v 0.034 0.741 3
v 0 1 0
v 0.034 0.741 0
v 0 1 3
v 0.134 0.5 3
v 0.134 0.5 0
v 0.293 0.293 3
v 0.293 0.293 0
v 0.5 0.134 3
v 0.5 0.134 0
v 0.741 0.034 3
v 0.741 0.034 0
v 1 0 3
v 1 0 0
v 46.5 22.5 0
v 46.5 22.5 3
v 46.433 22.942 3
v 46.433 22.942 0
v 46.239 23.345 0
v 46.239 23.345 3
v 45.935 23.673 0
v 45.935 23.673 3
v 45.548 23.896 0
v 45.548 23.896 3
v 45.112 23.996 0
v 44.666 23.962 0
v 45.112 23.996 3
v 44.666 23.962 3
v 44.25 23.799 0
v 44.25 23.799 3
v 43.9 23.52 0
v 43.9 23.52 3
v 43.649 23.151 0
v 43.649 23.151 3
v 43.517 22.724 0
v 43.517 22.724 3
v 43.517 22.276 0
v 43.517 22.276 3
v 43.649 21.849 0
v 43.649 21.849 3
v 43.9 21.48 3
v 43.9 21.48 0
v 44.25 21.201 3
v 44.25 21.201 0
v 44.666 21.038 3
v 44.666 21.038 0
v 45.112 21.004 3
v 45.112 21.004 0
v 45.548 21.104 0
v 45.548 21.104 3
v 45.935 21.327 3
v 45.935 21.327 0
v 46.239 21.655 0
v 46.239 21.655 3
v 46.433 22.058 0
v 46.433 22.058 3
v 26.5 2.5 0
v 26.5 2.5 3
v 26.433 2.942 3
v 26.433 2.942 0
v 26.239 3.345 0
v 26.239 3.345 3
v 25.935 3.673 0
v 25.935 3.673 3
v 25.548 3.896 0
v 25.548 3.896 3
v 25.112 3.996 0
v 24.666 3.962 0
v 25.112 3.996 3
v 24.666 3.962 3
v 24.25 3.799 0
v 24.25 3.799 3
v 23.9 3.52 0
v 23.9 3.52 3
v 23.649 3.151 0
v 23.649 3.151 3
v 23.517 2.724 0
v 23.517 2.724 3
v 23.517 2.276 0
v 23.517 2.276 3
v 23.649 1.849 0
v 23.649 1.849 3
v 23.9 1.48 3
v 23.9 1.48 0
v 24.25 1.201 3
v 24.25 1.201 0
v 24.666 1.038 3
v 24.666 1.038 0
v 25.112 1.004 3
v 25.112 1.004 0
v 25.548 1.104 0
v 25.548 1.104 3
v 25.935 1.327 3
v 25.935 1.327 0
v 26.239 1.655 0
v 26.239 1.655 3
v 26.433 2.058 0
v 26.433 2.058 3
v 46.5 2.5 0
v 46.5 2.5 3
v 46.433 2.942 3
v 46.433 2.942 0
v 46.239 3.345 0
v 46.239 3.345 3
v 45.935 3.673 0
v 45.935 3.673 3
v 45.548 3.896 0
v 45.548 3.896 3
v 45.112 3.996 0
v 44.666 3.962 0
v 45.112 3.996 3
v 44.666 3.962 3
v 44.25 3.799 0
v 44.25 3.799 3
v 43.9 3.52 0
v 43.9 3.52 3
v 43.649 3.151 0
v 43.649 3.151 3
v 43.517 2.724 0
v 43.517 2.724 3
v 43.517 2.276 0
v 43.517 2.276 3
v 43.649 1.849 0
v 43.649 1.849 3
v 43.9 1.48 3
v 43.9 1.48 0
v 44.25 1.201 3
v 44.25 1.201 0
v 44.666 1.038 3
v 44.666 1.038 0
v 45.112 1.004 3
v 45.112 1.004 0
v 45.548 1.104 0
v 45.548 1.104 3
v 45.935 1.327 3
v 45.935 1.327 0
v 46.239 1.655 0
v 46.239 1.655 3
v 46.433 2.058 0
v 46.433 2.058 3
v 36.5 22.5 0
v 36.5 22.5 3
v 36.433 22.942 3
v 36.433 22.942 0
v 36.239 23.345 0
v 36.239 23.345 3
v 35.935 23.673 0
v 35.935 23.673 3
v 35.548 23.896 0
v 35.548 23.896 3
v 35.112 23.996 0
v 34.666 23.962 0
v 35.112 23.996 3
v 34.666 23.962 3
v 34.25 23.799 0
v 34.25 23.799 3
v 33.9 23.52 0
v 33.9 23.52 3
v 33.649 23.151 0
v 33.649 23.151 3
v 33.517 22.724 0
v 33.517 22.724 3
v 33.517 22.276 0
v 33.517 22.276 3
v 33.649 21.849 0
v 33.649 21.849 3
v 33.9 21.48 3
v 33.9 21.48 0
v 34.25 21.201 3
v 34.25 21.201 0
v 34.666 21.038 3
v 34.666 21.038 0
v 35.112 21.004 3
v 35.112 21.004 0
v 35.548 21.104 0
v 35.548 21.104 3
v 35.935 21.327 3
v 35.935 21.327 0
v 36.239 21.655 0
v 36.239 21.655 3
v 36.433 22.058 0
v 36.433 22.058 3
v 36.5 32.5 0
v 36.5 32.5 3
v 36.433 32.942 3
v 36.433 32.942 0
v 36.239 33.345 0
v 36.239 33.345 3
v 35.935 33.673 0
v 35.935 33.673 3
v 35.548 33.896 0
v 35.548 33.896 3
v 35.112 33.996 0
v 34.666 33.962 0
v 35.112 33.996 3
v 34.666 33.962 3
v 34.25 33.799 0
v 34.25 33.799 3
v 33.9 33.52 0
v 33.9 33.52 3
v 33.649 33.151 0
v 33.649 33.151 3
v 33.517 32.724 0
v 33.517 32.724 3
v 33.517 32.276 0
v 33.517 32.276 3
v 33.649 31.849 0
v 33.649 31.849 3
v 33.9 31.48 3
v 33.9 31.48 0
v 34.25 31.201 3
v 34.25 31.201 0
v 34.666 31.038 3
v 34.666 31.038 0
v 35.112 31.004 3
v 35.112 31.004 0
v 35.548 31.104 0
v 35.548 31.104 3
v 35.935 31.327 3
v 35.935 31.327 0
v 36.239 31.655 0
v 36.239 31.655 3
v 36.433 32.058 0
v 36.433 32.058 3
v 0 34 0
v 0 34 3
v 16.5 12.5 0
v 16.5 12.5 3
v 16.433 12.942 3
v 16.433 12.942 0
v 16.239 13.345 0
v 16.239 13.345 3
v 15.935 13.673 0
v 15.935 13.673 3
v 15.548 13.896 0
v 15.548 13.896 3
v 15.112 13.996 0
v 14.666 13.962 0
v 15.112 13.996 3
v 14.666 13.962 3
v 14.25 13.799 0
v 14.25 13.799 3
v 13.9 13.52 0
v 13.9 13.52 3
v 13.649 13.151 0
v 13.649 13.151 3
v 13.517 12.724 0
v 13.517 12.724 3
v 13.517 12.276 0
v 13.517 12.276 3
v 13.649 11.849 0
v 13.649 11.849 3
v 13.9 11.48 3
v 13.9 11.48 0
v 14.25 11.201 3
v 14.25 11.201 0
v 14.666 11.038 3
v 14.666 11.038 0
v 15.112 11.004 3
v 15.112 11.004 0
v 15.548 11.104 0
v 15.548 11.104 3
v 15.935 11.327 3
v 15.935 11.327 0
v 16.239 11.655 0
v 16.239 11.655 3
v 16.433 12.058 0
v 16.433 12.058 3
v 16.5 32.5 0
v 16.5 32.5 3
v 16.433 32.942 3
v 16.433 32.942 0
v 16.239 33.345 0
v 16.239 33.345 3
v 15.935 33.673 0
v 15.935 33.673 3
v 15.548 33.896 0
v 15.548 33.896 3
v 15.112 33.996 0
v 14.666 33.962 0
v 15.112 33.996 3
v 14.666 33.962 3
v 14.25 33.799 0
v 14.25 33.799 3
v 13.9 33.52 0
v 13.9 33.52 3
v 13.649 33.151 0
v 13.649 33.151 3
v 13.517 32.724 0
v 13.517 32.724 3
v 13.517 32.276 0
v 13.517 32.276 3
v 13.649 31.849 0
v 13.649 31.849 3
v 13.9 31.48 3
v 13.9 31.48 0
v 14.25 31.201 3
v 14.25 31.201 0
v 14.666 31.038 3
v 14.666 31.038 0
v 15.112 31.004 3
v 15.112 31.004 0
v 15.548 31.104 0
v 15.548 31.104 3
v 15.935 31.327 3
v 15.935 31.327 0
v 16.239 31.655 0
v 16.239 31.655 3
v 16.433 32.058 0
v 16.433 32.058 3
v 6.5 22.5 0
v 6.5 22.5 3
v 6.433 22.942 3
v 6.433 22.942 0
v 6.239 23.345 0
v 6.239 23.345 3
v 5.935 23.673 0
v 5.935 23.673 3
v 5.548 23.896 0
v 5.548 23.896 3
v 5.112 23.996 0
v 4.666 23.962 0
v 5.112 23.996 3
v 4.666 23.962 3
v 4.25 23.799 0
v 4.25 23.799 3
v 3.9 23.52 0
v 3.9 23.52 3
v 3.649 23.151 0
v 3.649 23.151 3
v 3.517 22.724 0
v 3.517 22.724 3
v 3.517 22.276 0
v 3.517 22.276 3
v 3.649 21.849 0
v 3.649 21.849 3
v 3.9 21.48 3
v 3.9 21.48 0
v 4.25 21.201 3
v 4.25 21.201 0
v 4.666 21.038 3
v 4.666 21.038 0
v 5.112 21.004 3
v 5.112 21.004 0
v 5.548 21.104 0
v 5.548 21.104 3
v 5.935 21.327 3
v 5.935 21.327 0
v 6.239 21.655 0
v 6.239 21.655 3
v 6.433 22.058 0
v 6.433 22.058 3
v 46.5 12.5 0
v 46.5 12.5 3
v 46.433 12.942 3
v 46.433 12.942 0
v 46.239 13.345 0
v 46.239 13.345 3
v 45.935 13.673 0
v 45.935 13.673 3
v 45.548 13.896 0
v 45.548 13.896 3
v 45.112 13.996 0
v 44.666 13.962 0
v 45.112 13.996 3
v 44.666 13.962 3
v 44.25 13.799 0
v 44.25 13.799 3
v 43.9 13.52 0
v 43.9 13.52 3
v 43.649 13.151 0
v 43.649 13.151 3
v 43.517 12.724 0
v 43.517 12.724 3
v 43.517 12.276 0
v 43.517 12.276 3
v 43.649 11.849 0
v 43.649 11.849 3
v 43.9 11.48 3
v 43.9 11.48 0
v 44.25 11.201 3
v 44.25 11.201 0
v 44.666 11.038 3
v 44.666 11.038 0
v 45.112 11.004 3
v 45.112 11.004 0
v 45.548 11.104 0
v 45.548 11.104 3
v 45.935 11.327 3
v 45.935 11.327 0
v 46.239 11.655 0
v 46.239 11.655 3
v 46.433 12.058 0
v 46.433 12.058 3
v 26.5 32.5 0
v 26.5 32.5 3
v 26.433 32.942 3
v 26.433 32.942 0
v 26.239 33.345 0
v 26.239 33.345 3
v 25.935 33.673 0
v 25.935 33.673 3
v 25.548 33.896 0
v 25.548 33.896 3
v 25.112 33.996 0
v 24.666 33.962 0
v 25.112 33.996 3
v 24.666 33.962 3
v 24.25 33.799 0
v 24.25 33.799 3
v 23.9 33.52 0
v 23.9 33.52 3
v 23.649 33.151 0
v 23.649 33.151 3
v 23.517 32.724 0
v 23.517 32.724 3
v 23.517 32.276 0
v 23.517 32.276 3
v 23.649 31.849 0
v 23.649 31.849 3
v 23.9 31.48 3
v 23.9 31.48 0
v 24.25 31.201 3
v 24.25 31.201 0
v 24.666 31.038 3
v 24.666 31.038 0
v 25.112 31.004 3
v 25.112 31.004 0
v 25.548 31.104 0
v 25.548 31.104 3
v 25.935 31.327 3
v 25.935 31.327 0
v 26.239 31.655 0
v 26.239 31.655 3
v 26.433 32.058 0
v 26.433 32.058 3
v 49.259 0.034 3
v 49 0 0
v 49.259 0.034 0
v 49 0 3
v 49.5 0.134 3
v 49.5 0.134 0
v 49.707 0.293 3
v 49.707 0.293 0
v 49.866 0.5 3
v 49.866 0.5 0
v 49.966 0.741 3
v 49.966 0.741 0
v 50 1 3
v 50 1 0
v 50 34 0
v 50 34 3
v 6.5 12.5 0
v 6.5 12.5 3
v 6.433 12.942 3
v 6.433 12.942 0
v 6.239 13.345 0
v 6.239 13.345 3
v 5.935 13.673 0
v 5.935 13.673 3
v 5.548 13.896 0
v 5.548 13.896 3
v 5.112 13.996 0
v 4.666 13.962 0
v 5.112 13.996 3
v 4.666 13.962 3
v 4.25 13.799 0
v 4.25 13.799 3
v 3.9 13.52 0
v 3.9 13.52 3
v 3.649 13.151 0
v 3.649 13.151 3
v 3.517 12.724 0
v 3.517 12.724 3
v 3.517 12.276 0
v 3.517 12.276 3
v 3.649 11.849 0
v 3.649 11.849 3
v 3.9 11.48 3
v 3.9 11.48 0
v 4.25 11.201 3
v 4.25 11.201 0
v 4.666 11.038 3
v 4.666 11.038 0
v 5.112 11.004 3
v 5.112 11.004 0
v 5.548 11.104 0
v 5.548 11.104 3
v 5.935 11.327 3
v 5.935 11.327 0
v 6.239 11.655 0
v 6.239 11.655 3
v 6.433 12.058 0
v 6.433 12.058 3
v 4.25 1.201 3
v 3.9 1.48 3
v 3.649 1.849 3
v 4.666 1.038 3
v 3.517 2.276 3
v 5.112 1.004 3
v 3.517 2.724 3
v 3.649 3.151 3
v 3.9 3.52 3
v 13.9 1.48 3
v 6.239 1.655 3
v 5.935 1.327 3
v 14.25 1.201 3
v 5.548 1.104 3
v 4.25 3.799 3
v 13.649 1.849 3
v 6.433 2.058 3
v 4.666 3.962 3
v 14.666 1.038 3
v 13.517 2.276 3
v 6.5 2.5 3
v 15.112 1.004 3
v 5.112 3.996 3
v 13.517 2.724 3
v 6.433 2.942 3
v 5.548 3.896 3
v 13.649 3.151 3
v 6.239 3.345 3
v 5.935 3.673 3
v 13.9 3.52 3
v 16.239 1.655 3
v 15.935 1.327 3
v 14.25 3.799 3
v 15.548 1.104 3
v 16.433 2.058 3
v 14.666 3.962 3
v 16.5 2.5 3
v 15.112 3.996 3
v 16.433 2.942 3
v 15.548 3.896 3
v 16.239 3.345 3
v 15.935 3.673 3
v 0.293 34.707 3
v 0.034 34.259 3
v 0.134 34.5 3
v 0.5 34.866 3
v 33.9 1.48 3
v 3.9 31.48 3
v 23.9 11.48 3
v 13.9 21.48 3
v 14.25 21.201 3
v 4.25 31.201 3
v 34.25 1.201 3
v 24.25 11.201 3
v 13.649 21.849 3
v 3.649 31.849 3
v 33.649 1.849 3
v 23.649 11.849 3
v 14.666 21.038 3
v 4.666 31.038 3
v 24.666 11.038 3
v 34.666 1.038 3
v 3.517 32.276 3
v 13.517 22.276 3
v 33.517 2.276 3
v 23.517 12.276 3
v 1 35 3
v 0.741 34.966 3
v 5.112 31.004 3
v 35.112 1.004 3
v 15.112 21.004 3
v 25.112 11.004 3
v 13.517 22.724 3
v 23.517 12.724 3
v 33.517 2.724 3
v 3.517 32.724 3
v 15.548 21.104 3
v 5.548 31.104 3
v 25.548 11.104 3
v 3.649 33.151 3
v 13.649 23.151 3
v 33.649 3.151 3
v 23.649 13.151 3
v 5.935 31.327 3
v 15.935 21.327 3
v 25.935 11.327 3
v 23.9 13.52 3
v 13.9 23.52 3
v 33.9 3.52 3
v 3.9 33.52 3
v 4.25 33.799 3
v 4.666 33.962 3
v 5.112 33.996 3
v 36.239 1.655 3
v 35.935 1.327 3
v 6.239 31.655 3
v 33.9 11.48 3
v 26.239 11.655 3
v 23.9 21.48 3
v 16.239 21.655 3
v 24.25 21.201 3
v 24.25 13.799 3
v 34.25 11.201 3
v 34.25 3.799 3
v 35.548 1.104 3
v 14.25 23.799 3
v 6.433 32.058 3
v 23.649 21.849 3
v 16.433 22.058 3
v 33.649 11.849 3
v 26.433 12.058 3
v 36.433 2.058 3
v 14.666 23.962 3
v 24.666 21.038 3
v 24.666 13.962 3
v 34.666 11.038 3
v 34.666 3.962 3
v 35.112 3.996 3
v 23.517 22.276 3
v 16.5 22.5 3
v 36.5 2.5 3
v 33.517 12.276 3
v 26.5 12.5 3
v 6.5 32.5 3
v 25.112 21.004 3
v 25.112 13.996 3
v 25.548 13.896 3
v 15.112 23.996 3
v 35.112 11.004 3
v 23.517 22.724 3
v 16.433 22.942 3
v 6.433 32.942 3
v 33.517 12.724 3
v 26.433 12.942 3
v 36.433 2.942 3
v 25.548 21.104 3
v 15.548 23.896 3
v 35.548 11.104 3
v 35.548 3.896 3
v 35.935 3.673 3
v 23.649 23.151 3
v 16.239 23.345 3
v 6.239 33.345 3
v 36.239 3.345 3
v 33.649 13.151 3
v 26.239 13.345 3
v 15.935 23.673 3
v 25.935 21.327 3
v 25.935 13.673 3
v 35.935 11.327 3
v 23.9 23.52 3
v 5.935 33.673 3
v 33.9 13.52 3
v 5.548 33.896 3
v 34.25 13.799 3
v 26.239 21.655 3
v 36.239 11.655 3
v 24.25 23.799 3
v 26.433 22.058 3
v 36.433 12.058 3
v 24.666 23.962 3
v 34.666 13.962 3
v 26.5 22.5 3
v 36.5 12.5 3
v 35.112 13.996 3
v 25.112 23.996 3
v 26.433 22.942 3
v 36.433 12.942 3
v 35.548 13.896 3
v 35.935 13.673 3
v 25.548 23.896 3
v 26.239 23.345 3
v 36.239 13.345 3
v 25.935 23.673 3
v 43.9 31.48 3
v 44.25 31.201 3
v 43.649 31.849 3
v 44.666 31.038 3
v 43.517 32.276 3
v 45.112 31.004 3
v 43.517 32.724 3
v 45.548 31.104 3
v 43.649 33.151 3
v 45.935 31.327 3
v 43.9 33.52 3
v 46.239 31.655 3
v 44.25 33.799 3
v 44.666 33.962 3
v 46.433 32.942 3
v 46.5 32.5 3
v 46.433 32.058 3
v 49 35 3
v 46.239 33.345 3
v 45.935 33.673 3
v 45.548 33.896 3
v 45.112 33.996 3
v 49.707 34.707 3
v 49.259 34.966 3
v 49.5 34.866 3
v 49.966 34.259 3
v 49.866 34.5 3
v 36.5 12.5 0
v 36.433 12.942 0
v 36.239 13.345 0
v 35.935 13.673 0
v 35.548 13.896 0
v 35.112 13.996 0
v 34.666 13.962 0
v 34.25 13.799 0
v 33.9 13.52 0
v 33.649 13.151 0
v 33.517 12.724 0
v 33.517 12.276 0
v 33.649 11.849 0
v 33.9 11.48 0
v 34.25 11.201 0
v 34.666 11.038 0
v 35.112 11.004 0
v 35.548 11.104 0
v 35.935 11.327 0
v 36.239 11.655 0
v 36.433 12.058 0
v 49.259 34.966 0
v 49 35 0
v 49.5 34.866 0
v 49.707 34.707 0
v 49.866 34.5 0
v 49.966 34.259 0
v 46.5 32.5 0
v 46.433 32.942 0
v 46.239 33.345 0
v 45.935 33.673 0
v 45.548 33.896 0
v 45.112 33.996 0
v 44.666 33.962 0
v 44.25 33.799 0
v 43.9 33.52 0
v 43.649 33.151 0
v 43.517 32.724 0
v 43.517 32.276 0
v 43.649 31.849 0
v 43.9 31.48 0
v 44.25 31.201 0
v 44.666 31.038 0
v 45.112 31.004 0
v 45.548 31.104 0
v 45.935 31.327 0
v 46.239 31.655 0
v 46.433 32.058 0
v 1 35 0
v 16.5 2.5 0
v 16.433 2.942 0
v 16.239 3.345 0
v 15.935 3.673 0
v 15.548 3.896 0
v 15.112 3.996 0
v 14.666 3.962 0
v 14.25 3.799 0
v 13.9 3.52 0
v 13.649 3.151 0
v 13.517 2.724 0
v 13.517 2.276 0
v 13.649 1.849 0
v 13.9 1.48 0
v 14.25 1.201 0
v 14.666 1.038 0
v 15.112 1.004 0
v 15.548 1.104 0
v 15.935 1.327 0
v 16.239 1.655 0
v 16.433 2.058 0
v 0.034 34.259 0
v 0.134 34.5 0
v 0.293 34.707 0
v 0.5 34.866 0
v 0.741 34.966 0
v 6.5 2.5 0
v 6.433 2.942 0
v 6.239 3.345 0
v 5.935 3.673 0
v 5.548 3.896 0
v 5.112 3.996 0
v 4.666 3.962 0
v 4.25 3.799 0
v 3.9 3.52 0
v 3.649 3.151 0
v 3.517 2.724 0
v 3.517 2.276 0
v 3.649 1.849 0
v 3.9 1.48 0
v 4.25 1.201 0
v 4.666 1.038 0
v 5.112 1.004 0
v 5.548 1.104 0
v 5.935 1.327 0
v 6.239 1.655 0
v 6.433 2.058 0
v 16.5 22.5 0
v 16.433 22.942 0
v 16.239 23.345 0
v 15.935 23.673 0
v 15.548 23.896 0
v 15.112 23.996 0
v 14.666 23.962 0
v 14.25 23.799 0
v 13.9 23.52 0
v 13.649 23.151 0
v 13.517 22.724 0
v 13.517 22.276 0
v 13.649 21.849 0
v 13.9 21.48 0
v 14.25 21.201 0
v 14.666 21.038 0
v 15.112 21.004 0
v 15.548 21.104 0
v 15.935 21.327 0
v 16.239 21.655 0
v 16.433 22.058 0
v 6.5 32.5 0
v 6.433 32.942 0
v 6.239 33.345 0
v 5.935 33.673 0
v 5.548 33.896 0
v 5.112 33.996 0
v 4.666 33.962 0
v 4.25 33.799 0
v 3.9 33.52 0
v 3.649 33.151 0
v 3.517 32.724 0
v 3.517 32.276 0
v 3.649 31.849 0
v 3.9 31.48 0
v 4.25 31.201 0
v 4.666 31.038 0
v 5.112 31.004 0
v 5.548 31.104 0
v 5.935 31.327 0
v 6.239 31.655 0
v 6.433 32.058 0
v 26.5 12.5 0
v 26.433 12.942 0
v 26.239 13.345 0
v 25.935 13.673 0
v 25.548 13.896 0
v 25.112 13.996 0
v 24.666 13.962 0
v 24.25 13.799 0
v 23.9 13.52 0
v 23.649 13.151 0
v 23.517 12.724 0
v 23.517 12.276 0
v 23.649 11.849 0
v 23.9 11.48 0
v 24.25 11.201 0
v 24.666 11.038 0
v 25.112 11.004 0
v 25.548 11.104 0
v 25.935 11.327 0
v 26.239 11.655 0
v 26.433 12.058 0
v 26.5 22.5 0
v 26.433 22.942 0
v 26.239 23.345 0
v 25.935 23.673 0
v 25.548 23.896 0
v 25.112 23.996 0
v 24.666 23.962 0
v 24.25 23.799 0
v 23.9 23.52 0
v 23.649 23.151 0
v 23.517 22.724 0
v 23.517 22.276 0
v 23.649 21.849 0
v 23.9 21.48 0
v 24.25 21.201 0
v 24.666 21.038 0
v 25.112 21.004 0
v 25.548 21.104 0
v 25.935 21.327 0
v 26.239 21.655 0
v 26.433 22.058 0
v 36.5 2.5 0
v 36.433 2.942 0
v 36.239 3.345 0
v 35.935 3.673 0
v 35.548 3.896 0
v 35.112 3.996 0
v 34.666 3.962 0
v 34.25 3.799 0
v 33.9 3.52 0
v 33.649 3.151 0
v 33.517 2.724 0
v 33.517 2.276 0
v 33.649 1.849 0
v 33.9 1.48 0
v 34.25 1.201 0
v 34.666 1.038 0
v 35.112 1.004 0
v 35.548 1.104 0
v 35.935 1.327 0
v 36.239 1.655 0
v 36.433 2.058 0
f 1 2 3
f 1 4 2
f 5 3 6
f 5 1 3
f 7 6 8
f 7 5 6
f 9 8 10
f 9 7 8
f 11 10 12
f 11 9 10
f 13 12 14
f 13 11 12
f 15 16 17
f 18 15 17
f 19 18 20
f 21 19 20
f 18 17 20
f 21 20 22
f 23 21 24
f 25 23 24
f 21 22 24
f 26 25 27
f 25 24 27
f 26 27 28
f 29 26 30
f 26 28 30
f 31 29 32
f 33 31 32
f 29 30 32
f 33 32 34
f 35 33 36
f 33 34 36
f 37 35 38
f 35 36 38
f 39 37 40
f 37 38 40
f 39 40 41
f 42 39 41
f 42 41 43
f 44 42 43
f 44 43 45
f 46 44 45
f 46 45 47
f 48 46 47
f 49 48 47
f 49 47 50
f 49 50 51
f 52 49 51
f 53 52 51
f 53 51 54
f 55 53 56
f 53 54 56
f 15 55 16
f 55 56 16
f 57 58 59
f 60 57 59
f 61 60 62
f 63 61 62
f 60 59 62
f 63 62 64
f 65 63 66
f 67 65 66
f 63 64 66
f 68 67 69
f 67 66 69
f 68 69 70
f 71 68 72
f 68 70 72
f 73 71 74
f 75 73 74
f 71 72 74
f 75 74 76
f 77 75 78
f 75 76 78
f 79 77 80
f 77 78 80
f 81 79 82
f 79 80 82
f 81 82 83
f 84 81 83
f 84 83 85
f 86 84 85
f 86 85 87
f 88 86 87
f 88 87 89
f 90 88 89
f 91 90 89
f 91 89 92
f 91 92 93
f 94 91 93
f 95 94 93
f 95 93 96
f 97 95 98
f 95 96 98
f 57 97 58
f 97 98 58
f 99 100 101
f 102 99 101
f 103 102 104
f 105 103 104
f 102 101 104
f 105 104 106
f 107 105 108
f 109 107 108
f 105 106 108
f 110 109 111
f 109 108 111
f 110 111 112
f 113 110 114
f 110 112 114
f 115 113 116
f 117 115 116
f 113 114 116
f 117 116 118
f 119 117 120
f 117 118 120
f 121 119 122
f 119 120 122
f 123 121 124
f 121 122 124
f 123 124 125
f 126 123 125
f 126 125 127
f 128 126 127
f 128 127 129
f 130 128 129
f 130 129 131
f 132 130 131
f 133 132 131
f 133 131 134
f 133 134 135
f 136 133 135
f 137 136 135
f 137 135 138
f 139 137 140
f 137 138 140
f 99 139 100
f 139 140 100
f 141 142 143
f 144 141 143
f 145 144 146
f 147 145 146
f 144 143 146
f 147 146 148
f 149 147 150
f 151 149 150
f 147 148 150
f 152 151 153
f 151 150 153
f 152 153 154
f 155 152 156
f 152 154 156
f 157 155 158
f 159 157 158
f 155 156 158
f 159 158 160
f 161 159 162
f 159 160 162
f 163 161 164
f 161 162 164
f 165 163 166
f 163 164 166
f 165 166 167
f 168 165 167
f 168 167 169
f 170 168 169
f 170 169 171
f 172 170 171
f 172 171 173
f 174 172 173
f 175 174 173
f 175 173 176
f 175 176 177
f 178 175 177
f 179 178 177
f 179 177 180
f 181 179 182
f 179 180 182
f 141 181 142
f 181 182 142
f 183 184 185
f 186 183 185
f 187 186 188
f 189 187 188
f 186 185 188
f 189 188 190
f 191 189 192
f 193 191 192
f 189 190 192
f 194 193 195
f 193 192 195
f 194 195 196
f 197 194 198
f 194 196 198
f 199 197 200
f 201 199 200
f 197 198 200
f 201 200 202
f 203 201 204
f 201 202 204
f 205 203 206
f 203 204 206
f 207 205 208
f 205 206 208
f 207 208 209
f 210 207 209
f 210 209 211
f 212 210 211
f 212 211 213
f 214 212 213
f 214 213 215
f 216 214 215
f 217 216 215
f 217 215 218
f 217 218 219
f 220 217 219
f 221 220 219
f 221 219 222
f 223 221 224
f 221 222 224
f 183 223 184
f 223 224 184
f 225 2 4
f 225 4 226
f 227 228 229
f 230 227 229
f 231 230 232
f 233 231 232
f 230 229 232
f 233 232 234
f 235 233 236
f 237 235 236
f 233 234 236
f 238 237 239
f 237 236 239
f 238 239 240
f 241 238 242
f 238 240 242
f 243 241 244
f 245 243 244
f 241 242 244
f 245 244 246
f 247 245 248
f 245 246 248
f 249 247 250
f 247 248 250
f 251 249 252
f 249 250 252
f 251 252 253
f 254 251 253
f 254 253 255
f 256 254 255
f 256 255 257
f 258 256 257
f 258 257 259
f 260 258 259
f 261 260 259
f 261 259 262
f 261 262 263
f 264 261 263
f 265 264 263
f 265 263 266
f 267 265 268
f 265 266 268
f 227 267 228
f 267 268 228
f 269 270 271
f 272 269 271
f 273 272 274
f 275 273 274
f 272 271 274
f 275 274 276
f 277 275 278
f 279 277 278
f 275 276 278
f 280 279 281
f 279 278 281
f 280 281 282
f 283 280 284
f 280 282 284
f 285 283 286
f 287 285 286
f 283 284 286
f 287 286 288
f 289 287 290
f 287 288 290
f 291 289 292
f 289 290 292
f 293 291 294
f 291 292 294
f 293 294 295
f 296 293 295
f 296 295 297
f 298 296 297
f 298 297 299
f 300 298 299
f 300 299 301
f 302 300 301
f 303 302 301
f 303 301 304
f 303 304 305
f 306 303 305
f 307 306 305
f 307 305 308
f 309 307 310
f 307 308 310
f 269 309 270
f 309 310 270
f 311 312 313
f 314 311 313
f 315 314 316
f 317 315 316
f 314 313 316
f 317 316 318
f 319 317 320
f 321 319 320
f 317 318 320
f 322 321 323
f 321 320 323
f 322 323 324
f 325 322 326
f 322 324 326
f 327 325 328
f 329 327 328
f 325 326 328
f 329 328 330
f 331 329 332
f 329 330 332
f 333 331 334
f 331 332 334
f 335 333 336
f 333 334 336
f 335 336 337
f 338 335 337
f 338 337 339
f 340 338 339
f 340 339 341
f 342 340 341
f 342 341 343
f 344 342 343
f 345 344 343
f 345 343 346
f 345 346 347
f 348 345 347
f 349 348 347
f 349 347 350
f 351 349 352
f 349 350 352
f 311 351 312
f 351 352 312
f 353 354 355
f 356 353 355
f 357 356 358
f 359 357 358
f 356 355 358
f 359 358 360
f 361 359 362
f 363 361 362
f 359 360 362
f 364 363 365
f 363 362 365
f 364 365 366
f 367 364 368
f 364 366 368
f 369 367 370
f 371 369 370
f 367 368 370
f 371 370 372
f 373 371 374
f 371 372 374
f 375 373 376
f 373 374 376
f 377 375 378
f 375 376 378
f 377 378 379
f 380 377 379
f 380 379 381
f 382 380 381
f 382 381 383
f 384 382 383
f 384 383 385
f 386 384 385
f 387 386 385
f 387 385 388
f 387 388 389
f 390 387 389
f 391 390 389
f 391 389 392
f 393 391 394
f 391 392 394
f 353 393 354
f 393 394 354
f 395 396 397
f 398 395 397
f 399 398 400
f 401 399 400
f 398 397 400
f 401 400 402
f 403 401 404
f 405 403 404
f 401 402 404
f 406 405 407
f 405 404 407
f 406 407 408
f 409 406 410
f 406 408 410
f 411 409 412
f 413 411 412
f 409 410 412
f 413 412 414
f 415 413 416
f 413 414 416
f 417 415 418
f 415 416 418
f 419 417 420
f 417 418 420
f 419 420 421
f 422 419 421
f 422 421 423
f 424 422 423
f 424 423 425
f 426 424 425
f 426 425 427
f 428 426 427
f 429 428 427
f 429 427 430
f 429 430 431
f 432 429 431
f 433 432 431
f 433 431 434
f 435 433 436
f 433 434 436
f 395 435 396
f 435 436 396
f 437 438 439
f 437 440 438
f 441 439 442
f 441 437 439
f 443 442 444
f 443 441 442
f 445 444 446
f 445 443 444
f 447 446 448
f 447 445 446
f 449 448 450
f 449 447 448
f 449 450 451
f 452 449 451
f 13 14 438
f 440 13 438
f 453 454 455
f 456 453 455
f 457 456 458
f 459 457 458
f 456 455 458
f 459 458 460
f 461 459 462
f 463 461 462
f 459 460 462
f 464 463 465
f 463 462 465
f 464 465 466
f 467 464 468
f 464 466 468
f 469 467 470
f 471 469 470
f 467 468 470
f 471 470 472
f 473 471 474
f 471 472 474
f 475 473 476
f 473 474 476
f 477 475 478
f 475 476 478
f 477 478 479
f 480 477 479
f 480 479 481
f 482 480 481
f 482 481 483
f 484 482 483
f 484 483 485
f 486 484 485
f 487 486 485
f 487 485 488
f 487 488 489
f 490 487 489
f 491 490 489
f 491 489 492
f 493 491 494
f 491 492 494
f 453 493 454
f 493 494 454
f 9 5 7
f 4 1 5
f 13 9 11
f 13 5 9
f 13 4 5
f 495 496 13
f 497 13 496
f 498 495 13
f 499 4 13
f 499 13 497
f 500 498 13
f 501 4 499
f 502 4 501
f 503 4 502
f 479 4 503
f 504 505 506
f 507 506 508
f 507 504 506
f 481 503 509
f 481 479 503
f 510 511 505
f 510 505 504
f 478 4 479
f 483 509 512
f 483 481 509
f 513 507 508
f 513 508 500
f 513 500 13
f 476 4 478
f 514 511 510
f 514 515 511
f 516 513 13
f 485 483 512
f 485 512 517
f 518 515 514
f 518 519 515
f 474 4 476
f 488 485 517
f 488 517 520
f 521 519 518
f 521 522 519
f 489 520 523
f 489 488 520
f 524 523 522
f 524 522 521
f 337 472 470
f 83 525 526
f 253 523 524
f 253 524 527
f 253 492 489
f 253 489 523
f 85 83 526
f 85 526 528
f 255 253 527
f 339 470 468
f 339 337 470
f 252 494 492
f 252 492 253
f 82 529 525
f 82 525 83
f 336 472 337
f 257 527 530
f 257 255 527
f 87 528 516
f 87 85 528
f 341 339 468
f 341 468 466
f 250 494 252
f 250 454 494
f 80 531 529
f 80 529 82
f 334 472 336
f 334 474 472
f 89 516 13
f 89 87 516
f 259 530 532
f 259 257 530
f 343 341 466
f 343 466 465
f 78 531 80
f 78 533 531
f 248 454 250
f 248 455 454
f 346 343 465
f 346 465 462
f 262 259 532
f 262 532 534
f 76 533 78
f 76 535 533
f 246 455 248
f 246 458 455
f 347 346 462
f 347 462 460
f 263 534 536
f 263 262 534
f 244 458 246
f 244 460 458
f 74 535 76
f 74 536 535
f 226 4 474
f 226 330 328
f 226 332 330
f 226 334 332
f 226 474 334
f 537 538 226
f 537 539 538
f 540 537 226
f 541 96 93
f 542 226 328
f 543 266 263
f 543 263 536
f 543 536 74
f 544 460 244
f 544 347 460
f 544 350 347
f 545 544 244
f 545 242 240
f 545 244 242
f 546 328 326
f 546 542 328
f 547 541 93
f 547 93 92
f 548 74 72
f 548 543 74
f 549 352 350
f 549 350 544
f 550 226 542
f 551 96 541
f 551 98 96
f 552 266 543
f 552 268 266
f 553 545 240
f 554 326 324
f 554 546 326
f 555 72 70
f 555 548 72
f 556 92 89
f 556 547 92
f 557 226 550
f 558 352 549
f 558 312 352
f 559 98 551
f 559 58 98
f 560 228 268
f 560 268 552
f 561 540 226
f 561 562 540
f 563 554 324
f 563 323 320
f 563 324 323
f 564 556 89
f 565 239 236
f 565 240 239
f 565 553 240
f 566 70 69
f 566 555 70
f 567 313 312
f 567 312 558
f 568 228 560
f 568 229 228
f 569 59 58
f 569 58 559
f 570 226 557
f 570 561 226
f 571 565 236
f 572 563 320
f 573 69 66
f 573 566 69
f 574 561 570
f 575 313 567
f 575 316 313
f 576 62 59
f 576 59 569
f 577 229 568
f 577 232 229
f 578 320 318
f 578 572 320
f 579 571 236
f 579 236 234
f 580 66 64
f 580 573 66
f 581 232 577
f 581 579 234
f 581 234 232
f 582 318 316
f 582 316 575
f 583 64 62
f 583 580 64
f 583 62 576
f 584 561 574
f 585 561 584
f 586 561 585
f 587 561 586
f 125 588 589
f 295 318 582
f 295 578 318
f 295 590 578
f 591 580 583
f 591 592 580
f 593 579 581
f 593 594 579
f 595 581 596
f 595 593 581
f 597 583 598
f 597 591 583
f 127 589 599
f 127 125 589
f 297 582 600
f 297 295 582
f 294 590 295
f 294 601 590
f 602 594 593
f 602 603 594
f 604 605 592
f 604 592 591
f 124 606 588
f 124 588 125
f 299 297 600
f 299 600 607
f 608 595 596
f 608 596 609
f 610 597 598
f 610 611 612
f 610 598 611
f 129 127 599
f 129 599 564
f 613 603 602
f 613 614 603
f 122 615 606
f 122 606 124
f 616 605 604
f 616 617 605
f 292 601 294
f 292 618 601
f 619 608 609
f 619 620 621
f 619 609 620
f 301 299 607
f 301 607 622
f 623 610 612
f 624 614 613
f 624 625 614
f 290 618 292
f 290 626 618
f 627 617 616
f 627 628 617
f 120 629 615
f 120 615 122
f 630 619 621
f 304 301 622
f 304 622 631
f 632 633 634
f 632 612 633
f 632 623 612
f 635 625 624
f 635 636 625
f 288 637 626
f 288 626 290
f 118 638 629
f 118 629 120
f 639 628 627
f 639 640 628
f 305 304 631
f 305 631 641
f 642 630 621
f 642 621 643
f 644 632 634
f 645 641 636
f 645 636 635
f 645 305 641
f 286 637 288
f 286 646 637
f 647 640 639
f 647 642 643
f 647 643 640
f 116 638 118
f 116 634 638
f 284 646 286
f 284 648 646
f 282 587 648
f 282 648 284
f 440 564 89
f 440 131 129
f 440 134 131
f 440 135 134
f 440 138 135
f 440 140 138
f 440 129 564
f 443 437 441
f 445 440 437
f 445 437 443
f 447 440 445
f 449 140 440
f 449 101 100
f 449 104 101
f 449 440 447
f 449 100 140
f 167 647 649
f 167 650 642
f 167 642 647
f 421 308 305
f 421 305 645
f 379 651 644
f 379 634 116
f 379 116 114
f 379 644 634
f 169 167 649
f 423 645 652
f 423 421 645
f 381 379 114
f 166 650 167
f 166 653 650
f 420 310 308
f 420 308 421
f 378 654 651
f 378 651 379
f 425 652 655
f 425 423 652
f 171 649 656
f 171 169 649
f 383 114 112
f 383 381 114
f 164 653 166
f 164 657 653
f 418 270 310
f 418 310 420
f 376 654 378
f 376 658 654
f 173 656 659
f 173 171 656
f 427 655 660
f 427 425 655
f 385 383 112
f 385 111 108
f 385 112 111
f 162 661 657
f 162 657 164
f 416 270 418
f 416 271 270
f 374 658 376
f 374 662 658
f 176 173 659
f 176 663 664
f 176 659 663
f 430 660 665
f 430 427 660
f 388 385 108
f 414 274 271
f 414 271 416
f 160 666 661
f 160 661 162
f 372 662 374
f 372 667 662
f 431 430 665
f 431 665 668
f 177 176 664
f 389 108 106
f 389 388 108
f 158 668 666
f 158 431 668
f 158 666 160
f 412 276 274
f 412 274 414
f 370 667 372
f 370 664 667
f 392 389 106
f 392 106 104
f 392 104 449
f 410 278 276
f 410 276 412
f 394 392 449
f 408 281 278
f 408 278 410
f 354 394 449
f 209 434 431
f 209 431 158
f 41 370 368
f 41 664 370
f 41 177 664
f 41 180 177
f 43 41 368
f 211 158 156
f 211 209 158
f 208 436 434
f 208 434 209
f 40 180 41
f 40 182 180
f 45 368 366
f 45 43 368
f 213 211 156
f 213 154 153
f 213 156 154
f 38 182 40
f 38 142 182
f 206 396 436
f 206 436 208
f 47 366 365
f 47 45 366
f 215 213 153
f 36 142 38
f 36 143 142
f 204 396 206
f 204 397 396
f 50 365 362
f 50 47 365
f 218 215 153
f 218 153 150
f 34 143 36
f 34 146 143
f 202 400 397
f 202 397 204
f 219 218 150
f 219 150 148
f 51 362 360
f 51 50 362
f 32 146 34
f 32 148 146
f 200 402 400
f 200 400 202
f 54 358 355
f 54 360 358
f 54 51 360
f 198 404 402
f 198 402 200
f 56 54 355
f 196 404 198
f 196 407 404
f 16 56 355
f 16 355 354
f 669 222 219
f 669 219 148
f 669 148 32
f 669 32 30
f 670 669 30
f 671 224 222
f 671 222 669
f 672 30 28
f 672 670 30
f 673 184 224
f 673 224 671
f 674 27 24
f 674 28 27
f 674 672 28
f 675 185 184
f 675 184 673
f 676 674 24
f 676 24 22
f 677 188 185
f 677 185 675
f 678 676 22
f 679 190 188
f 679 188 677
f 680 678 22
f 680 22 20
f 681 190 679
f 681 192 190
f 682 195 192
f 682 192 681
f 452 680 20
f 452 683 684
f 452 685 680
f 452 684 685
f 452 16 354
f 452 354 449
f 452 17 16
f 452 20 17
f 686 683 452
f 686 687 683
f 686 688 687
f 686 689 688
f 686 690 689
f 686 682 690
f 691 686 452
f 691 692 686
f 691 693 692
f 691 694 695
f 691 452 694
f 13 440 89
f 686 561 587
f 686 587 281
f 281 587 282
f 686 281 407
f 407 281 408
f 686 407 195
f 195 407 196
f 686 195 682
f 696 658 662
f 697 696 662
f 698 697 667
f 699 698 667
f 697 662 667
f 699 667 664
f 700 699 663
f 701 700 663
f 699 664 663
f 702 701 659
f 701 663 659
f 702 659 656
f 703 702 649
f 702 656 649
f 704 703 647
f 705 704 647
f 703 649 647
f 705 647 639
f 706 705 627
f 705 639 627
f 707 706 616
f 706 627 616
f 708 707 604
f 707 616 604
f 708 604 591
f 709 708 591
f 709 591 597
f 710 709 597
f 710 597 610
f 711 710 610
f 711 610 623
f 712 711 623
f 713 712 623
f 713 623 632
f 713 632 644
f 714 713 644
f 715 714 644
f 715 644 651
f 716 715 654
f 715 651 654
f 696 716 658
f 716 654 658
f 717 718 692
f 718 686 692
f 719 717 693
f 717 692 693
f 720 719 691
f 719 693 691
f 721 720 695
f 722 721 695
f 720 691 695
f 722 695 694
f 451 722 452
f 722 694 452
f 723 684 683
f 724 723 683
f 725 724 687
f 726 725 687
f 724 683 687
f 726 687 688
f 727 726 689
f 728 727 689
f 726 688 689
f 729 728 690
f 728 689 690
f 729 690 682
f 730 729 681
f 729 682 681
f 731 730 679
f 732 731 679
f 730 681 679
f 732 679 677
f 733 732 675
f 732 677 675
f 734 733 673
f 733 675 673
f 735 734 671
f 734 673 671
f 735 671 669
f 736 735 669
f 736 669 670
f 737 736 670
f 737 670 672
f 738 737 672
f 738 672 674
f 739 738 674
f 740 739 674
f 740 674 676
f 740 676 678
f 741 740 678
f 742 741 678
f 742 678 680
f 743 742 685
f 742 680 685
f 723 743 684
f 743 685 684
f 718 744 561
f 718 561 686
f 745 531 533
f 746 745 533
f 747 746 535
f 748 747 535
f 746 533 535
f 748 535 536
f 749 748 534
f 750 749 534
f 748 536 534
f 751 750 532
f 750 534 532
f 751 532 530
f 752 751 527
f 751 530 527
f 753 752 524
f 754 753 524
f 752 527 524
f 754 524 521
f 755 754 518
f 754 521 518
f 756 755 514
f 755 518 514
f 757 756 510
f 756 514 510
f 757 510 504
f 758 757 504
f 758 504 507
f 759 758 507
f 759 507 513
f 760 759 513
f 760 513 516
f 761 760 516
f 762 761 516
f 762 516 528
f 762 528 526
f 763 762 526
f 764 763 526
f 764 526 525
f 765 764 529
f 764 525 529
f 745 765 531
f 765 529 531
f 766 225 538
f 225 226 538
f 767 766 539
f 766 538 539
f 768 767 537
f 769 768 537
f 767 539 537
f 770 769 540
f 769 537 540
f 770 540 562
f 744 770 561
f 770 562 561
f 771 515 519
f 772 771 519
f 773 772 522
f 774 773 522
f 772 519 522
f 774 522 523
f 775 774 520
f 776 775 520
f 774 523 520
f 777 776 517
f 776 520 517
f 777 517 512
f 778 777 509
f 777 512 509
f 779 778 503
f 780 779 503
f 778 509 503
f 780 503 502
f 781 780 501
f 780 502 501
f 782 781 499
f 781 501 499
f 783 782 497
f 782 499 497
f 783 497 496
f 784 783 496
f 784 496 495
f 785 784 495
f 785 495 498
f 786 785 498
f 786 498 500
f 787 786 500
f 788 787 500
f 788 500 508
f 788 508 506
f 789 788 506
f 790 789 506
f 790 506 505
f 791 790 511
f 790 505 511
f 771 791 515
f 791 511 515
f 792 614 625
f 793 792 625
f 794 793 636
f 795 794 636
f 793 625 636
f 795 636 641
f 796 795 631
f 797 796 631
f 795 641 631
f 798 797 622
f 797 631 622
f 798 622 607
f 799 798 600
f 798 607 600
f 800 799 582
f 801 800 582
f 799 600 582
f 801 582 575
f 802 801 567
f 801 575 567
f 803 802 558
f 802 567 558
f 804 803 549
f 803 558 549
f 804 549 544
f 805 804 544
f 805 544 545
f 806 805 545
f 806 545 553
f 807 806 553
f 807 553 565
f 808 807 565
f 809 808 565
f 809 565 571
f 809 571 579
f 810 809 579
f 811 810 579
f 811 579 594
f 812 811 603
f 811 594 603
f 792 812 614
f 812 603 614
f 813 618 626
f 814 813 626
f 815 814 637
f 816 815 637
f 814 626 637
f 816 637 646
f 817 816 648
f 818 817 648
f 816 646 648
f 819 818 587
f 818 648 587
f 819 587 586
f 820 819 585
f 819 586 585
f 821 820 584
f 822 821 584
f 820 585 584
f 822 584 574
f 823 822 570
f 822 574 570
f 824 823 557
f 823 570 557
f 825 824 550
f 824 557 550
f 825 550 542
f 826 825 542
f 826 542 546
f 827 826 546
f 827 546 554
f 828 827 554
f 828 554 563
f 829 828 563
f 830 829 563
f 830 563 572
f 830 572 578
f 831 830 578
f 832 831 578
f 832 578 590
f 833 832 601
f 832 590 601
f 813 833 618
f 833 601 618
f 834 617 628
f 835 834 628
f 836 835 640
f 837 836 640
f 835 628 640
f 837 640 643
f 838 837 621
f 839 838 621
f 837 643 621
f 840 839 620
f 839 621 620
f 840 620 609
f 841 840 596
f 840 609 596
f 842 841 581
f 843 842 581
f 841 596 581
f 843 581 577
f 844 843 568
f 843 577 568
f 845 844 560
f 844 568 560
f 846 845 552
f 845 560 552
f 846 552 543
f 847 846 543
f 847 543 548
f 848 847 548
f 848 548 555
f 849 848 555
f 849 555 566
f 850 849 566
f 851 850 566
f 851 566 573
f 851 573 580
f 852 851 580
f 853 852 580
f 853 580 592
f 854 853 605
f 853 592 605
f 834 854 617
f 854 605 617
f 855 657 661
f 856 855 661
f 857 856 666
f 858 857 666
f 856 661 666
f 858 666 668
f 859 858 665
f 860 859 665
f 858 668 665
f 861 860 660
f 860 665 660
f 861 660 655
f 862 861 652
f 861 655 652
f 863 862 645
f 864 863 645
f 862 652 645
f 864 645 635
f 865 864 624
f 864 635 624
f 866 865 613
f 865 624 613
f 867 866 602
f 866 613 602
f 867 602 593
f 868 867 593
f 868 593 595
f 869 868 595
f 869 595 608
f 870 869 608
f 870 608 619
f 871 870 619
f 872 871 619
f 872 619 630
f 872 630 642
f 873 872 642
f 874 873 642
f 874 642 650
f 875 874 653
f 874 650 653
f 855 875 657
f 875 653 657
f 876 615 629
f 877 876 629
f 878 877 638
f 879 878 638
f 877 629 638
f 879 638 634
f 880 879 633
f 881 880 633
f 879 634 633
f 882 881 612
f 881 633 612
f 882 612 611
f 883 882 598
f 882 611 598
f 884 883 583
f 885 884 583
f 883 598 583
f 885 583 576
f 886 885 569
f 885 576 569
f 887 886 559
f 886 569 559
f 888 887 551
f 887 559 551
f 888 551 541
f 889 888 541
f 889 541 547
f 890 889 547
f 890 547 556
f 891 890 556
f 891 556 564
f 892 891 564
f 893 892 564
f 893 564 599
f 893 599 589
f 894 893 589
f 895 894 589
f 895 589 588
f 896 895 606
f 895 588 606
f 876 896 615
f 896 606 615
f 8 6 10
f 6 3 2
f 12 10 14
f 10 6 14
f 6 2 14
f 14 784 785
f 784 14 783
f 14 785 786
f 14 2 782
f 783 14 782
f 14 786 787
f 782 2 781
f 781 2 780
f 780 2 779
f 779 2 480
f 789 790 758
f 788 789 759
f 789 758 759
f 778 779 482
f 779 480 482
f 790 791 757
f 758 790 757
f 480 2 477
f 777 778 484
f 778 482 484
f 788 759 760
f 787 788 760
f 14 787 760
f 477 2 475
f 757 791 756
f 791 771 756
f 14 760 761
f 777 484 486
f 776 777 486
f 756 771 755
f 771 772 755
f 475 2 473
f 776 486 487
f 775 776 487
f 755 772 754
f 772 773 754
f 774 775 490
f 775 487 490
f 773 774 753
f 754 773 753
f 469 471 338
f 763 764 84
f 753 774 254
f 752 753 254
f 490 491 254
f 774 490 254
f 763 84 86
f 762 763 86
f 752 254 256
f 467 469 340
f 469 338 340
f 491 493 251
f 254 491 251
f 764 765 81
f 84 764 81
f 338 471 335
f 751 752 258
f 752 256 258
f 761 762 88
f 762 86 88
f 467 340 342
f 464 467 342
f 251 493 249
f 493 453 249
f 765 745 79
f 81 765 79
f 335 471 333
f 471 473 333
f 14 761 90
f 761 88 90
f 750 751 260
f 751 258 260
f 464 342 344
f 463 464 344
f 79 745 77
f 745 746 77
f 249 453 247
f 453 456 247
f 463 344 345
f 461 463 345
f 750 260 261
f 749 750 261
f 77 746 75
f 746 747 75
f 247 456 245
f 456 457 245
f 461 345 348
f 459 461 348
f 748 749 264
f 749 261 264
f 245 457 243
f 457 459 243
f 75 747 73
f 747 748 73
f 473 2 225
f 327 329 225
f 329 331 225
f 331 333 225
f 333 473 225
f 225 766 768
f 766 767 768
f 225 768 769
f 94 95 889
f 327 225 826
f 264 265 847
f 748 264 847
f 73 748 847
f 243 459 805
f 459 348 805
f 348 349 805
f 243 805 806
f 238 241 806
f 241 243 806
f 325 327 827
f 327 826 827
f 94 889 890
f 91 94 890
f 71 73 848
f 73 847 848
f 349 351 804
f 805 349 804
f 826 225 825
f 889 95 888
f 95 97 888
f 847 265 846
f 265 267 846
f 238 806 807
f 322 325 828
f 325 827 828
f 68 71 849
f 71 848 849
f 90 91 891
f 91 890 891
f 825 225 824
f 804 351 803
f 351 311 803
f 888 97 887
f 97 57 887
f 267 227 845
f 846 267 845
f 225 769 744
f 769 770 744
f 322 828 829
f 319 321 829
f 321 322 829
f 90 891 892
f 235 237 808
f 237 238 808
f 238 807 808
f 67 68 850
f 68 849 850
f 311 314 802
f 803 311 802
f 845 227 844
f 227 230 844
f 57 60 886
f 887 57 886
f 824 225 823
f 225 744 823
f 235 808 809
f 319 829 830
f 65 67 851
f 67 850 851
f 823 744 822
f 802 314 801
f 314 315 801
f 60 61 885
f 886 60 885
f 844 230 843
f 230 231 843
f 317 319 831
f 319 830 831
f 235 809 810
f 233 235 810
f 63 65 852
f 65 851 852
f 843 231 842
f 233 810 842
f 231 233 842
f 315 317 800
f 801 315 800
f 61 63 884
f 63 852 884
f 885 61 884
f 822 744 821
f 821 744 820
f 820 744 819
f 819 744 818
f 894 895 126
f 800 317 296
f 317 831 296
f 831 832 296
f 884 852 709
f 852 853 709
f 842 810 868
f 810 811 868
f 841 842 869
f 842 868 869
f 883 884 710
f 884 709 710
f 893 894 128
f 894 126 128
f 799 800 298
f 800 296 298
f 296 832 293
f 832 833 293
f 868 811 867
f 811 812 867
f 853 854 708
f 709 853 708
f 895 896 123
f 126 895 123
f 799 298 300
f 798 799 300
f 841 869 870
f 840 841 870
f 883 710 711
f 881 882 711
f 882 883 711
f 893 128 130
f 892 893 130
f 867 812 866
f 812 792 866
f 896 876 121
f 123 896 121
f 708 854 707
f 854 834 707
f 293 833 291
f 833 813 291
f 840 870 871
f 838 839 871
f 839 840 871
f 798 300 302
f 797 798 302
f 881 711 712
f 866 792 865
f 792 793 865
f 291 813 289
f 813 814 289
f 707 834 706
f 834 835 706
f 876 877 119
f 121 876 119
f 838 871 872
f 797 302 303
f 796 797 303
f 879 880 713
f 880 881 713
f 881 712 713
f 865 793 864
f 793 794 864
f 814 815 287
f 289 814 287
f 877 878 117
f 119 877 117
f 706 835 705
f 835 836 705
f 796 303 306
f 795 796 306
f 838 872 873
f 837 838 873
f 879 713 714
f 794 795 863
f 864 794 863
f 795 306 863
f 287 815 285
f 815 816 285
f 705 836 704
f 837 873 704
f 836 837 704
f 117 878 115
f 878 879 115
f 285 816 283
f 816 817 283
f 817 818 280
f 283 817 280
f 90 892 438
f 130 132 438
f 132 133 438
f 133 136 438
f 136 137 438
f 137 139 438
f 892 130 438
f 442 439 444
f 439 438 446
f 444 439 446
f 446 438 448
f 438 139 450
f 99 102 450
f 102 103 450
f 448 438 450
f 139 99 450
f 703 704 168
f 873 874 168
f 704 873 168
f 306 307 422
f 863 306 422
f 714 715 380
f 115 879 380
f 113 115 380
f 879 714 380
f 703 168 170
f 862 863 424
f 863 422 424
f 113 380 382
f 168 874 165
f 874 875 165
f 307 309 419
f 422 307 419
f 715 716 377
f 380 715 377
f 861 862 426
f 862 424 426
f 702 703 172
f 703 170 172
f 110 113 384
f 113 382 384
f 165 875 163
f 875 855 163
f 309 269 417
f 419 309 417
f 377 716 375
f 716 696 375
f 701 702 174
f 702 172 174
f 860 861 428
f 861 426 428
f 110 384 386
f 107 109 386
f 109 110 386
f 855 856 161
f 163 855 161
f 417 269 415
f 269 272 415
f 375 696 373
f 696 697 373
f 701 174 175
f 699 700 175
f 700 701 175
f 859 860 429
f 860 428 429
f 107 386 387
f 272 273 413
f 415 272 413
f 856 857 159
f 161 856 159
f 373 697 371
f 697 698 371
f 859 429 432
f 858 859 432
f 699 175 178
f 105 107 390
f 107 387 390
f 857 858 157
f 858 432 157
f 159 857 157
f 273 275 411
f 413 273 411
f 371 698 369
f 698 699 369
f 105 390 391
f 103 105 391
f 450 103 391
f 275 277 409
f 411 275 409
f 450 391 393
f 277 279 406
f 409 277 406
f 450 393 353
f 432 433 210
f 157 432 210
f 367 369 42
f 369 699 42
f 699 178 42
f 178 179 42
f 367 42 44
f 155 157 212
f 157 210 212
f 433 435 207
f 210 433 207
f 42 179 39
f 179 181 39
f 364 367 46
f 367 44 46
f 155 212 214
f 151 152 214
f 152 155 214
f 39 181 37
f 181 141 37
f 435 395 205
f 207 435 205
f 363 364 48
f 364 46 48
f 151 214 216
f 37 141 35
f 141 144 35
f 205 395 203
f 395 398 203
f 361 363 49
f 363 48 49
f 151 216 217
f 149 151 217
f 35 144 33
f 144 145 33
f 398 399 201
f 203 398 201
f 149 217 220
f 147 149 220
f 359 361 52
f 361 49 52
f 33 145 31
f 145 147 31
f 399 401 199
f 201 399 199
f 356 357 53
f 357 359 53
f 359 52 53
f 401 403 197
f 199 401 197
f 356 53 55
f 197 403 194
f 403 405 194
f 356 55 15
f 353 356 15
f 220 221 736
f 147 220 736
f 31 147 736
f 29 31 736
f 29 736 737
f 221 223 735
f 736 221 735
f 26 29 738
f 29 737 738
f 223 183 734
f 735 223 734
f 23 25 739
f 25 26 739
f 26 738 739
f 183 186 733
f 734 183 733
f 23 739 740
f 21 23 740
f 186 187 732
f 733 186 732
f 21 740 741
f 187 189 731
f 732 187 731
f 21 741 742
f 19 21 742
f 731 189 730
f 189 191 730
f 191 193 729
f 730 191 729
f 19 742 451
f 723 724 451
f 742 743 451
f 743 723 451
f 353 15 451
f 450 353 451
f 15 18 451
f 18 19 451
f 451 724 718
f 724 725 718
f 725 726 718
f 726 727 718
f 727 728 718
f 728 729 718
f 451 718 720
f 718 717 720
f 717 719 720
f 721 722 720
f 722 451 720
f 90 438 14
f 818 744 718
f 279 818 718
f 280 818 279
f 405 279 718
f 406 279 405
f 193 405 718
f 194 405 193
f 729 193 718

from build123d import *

# Parameters (mm, degrees)
ESQUISSE1_W             = 50
ESQUISSE1_H             = 35
BOSS_EXTRU_1_DEPTH      = 3
ESQUISSE2_R             = 1.5
ENL_V_MAT_EXTRU_1_DEPTH = 3
CONG_1_R                = 1


with BuildPart() as part:
    # Esquisse1 → Boss.-Extru.1 (new body)
    with BuildSketch(Plane.XY):
        with Locations((25, 17.5)):
            Rectangle(ESQUISSE1_W, ESQUISSE1_H)
    extrude(amount=BOSS_EXTRU_1_DEPTH)

    # Esquisse2 → Enlèv. mat.-Extru.1 (cut)
    with BuildSketch(Plane.XY.offset(3)):
        with Locations((5, 32.5)):
            Circle(ESQUISSE2_R)
        with Locations((15, 32.5)):
            Circle(ESQUISSE2_R)
        with Locations((25, 32.5)):
            Circle(ESQUISSE2_R)
        with Locations((35, 32.5)):
            Circle(ESQUISSE2_R)
        with Locations((45, 32.5)):
            Circle(ESQUISSE2_R)
        with Locations((15, 22.5)):
            Circle(ESQUISSE2_R)
        with Locations((25, 22.5)):
            Circle(ESQUISSE2_R)
        with Locations((35, 22.5)):
            Circle(ESQUISSE2_R)
        with Locations((45, 22.5)):
            Circle(ESQUISSE2_R)
        with Locations((15, 12.5)):
            Circle(ESQUISSE2_R)
        with Locations((25, 12.5)):
            Circle(ESQUISSE2_R)
        with Locations((35, 12.5)):
            Circle(ESQUISSE2_R)
        with Locations((45, 12.5)):
            Circle(ESQUISSE2_R)
        with Locations((15, 2.5)):
            Circle(ESQUISSE2_R)
        with Locations((25, 2.5)):
            Circle(ESQUISSE2_R)
        with Locations((35, 2.5)):
            Circle(ESQUISSE2_R)
        with Locations((45, 2.5)):
            Circle(ESQUISSE2_R)
        with Locations((5, 22.5)):
            Circle(ESQUISSE2_R)
        with Locations((5, 12.5)):
            Circle(ESQUISSE2_R)
        with Locations((5, 2.5)):
            Circle(ESQUISSE2_R)
    extrude(amount=-ENL_V_MAT_EXTRU_1_DEPTH, mode=Mode.SUBTRACT)

    # Congé1
    cong_1_edges = [part.edges().sort_by_distance(p)[0] for p in [
        (0, 35, 1.5),
        (50, 35, 1.5),
        (50, 0, 1.5),
        (0, 0, 1.5),
    ]]
    fillet(cong_1_edges, radius=CONG_1_R)


solid = part.part
